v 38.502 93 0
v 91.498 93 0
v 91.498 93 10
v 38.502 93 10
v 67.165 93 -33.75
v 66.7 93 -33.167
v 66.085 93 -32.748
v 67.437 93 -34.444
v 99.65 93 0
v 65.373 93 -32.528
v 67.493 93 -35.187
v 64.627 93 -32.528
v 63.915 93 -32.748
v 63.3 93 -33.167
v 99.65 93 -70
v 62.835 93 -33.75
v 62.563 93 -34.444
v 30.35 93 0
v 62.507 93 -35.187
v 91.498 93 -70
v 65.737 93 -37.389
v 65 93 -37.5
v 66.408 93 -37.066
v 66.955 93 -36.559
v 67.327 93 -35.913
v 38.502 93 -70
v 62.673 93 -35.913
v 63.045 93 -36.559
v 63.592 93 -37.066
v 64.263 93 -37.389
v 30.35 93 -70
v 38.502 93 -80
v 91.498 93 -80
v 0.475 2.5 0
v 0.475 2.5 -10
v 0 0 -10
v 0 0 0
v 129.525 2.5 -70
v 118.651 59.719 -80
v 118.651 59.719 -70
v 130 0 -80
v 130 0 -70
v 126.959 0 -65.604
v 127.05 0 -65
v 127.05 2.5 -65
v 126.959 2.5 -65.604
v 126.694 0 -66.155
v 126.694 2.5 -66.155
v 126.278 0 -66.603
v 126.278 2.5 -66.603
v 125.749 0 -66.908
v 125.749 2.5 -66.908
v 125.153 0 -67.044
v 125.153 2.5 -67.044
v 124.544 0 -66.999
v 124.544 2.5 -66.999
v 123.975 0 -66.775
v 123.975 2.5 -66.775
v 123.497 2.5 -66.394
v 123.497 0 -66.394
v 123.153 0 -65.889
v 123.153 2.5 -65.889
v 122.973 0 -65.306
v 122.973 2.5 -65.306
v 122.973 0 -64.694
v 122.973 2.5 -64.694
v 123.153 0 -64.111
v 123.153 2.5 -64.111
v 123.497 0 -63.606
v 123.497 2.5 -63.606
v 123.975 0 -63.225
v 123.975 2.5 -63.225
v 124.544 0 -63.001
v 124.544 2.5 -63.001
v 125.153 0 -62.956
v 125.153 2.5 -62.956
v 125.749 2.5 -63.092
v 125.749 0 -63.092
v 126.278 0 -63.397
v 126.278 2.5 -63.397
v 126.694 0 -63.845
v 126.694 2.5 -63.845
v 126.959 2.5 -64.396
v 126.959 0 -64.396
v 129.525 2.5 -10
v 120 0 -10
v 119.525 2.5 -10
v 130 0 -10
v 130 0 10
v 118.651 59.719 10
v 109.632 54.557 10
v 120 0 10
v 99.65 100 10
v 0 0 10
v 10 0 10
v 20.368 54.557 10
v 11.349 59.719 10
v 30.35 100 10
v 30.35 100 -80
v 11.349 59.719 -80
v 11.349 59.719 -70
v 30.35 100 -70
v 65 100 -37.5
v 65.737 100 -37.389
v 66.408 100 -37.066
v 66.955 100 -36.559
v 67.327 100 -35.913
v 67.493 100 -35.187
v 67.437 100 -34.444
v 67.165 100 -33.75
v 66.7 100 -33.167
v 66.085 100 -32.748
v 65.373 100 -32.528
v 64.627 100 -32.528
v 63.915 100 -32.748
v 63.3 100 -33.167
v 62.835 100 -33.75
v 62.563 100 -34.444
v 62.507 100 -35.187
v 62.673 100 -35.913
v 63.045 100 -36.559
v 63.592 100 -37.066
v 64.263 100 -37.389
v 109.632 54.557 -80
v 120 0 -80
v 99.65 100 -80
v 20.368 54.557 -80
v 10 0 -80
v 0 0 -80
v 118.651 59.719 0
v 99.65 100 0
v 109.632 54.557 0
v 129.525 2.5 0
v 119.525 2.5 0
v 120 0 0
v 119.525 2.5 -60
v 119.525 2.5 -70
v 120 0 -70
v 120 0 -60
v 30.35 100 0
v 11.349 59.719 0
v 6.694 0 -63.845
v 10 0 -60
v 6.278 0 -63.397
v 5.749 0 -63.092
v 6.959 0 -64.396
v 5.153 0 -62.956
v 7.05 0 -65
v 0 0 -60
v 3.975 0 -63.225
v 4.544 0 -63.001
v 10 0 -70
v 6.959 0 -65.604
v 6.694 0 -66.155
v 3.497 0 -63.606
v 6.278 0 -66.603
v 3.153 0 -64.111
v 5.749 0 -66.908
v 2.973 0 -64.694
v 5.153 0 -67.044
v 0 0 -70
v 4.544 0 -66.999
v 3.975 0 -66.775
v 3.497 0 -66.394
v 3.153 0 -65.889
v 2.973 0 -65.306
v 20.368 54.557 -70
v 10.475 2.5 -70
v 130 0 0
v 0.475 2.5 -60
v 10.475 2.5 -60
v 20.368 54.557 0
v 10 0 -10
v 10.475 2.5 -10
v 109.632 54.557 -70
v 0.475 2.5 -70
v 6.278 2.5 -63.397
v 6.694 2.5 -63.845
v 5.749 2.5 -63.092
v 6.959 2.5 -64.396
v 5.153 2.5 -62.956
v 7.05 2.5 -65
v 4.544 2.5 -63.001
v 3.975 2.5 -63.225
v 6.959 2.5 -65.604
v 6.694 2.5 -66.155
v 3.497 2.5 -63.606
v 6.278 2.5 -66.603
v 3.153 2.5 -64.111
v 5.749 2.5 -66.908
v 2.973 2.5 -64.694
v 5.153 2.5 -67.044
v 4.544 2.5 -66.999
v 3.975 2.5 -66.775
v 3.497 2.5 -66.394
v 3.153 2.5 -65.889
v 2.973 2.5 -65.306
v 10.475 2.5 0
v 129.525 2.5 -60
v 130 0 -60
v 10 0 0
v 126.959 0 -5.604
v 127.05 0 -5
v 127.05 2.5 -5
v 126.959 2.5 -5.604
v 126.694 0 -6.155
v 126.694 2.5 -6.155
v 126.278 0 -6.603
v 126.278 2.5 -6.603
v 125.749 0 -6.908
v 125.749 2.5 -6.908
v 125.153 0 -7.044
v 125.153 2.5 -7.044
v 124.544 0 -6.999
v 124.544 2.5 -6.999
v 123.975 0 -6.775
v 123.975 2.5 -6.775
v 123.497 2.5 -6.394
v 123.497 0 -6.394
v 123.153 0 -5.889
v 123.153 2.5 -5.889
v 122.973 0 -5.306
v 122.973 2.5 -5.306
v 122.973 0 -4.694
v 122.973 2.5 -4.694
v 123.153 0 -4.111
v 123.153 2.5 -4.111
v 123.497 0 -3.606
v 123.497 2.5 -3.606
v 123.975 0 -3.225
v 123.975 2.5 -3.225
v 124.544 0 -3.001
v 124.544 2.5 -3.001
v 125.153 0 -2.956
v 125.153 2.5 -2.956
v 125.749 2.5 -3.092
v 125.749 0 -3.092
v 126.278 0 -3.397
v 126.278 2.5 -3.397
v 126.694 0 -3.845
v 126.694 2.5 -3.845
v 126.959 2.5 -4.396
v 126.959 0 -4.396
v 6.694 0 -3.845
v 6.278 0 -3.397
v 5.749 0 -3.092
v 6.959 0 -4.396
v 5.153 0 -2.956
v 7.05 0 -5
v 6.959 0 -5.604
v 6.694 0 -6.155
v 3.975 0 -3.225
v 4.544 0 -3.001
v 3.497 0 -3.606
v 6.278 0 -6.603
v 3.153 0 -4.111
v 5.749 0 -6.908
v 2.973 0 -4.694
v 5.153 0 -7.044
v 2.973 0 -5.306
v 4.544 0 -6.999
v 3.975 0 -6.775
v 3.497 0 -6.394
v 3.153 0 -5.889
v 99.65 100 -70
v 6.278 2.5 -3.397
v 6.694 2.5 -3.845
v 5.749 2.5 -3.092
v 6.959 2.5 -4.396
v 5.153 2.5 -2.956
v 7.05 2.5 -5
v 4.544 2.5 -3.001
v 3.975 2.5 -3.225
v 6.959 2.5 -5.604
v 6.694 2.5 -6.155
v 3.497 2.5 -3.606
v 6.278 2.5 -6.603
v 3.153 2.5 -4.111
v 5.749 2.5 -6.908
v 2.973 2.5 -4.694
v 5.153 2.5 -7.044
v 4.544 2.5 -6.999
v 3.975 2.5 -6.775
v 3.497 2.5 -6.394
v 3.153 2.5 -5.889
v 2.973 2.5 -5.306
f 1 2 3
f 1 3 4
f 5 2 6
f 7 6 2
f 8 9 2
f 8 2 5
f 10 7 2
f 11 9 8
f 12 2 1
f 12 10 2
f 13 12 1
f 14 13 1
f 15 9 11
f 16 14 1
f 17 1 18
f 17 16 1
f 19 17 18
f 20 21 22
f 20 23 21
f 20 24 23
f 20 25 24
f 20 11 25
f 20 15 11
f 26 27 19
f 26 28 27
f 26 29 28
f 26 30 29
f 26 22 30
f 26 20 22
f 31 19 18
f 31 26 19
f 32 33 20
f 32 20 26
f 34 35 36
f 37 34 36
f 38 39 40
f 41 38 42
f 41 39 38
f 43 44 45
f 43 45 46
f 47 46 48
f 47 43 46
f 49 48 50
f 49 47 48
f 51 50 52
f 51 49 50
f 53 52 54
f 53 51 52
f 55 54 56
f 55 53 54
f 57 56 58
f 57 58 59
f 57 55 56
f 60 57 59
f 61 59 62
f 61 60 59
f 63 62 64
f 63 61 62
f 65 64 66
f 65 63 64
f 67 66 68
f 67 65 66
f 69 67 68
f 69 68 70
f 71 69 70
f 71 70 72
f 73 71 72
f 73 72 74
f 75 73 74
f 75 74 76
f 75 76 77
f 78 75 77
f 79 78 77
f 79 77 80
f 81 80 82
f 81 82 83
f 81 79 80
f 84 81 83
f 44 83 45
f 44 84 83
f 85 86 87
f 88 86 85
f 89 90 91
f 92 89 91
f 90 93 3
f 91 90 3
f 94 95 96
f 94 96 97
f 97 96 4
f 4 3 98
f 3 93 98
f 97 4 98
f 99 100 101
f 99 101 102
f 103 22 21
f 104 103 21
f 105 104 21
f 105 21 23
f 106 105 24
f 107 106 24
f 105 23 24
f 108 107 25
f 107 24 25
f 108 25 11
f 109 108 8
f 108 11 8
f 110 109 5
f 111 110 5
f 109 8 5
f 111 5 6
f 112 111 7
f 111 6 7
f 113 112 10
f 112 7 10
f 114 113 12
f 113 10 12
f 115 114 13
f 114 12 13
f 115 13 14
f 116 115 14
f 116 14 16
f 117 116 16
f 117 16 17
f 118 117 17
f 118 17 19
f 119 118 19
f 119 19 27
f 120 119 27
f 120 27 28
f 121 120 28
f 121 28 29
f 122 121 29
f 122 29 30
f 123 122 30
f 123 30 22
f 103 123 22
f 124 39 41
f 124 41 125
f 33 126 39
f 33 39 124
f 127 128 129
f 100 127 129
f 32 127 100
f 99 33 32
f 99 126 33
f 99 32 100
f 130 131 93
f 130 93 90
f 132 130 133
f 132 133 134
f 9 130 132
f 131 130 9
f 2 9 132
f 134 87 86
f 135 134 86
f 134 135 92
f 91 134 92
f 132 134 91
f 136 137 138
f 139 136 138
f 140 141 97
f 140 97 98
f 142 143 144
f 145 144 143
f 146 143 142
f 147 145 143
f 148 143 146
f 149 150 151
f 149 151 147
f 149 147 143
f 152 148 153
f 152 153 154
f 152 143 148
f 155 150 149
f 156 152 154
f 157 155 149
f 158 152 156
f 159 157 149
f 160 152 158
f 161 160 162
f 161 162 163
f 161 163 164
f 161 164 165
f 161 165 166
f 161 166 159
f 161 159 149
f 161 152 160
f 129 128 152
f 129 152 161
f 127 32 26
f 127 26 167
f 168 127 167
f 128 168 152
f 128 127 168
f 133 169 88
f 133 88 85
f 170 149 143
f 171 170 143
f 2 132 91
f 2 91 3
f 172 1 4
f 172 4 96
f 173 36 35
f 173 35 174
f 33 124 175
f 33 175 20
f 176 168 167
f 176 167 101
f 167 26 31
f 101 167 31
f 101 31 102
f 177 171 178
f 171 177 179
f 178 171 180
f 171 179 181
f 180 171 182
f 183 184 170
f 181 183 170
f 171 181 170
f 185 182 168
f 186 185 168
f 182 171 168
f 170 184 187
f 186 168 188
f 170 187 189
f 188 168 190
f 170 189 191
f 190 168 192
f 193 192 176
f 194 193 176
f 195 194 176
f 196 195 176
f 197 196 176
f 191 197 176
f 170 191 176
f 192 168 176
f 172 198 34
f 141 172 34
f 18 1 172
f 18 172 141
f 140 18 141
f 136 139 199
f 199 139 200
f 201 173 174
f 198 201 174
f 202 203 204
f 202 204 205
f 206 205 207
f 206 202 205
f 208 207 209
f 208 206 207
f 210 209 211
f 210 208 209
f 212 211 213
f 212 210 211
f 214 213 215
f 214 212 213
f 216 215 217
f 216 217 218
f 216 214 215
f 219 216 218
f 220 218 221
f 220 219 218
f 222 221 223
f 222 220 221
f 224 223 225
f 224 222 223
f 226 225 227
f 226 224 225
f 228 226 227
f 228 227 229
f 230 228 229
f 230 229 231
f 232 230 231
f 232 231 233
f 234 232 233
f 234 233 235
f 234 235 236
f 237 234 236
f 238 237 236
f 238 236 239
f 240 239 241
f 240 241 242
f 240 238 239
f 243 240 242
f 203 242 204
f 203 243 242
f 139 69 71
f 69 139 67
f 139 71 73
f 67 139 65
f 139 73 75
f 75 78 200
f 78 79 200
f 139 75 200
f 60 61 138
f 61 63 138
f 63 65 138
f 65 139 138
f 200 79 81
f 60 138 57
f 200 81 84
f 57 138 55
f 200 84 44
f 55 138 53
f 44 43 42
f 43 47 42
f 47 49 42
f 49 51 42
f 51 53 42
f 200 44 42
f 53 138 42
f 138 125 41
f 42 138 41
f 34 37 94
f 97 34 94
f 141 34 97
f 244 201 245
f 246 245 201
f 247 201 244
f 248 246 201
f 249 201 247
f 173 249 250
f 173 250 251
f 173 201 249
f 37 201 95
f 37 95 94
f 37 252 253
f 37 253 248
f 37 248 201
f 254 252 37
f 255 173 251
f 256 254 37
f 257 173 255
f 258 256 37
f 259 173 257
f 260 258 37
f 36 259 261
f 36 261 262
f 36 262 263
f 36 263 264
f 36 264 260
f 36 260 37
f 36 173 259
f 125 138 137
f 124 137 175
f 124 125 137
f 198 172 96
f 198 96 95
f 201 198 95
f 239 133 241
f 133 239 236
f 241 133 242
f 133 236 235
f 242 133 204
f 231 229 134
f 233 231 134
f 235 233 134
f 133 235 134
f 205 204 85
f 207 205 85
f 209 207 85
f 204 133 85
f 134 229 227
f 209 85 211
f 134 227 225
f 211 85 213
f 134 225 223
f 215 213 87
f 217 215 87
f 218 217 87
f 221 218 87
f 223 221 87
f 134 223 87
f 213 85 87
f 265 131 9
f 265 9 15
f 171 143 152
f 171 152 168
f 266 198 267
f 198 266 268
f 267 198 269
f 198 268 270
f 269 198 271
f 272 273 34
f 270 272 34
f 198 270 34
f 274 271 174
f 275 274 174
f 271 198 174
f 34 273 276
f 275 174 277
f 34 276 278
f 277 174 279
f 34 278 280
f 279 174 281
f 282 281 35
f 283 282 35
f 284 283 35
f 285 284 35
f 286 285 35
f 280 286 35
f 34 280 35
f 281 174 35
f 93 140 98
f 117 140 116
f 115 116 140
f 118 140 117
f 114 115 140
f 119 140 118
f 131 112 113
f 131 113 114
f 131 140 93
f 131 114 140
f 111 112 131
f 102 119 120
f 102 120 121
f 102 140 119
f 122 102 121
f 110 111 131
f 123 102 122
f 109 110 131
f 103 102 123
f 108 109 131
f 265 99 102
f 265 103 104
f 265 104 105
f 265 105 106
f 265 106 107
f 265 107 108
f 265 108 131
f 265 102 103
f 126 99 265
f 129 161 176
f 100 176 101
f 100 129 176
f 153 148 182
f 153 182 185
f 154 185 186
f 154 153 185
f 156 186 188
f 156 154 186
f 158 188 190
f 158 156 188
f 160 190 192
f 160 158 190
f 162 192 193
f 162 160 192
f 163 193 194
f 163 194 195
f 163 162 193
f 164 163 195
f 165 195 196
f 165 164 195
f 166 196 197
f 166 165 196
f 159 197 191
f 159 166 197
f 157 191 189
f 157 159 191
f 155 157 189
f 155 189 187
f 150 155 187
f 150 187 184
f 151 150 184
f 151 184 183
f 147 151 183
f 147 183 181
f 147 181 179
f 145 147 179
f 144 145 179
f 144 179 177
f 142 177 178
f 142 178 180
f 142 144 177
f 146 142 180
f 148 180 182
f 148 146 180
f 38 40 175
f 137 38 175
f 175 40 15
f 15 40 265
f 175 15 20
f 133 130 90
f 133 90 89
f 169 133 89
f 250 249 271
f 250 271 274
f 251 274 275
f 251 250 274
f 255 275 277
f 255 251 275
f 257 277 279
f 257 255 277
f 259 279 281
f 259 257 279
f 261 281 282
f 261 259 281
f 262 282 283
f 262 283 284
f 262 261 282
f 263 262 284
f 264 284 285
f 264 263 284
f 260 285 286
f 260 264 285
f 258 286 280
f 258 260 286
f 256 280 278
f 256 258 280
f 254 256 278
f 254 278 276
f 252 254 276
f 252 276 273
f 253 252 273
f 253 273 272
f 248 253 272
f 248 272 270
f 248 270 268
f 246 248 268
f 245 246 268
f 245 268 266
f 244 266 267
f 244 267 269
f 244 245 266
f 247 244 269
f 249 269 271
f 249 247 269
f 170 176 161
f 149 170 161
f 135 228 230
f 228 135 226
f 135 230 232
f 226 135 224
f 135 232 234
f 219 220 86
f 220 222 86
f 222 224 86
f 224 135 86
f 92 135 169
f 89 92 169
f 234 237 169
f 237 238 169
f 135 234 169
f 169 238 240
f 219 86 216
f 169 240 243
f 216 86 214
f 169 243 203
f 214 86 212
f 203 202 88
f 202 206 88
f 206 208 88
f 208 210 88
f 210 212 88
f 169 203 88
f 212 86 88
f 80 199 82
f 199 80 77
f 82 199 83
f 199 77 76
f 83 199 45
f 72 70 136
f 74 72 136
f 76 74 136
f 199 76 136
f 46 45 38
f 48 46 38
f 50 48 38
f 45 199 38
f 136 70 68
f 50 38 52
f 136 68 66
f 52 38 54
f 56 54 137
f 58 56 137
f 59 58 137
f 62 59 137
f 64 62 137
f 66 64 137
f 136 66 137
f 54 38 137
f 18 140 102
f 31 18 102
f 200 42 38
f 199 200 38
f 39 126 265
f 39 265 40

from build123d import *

# Parameters (mm, degrees)
BOSS_EXTRUDE1_DEPTH    = 10
LPATTERN1_COUNT        = 2
LPATTERN1_PITCH        = 80
SKETCH2_W              = 69.30058394
SKETCH2_H              = 90
BOSS_EXTRUDE2_DEPTH    = 7
SKETCH3_R              = 2.5
CUT_EXTRUDE1_DEPTH     = 10
BOSS_EXTRUDE3_DEPTH    = 77
CUT_EXTRUDE2_START     = -2.5
CUT_EXTRUDE2_OUTLINE_W = 20.397762745
CUT_EXTRUDE2_OUTLINE_H = 50
CUT_EXTRUDE2_OUTLINE_R = 2.05
CUT_EXTRUDE2_DEPTH     = 2.5


# Read off the part's stored shape, not the designer's step: Cut-Extrude2
with BuildPart() as part:
    # Sketch1 → Boss-Extrude1 (new body)
    with BuildSketch(Plane.XY):
        Polygon((0, 0), (11.349310372, 59.718827606), (30.34970803, 100), (99.65029197, 100), (118.650689628, 59.718827606), (130, 0), (120, 0), (109.631710362, 54.556803995), (91.49827561, 93), (38.50172439, 93), (20.368289638, 54.556803995), (10, 0), align=None)
    extrude(amount=BOSS_EXTRUDE1_DEPTH)


with BuildPart() as lpattern1_1:
    # LPattern1: pattern copy
    add(part.part.moved(Location(Vector(0, 0, -1) * (1 * LPATTERN1_PITCH))))


with BuildPart() as part_1:
    add(part.part)

    add(lpattern1_1.part)  # Boss-Extrude2 merges LPattern1_1
    # Sketch2 → Boss-Extrude2 (add)
    with BuildSketch(Plane(origin=(0, 100, 0), x_dir=(1, 0, 0), z_dir=(0, 1, 0))):
        with Locations((65, 35)):
            Rectangle(SKETCH2_W, SKETCH2_H)
    extrude(amount=-BOSS_EXTRUDE2_DEPTH)

    # Sketch3 → Cut-Extrude1 (cut)
    with BuildSketch(Plane.XZ.offset(-93)):
        with Locations(Location((65, -35, 0), (0, 0, 270))):
            Circle(SKETCH3_R)
    extrude(amount=-CUT_EXTRUDE1_DEPTH, mode=Mode.SUBTRACT)

    # Sketch4 → Boss-Extrude3 (add)
    with BuildSketch(Plane.XY.offset(-70)):
        Polygon((130, 0), (129.524885584, 2.5), (119.524885584, 2.5), (120, 0), align=None)
        Polygon((0, 0), (10, 0), (10.475114416, 2.5), (0.475114416, 2.5), align=None)
    extrude(amount=BOSS_EXTRUDE3_DEPTH)

    # Cut-Extrude2 outline → Cut-Extrude2 (cut)
    with BuildSketch(Plane(origin=(0, 2.5, 0), x_dir=(1, 0, 0), z_dir=(0, 1, 0)).offset(CUT_EXTRUDE2_START)):
        with Locations((129.723766957, 35)):
            Rectangle(CUT_EXTRUDE2_OUTLINE_W, CUT_EXTRUDE2_OUTLINE_H)
        with Locations((0.276233043, 35)):
            Rectangle(CUT_EXTRUDE2_OUTLINE_W, CUT_EXTRUDE2_OUTLINE_H)
        with Locations((125, 65)):
            Circle(CUT_EXTRUDE2_OUTLINE_R)
        with Locations((125, 5)):
            Circle(CUT_EXTRUDE2_OUTLINE_R)
        with Locations((5, 5)):
            Circle(CUT_EXTRUDE2_OUTLINE_R)
        with Locations((5, 65)):
            Circle(CUT_EXTRUDE2_OUTLINE_R)
    extrude(amount=CUT_EXTRUDE2_DEPTH, mode=Mode.SUBTRACT)


solid = part_1.part
